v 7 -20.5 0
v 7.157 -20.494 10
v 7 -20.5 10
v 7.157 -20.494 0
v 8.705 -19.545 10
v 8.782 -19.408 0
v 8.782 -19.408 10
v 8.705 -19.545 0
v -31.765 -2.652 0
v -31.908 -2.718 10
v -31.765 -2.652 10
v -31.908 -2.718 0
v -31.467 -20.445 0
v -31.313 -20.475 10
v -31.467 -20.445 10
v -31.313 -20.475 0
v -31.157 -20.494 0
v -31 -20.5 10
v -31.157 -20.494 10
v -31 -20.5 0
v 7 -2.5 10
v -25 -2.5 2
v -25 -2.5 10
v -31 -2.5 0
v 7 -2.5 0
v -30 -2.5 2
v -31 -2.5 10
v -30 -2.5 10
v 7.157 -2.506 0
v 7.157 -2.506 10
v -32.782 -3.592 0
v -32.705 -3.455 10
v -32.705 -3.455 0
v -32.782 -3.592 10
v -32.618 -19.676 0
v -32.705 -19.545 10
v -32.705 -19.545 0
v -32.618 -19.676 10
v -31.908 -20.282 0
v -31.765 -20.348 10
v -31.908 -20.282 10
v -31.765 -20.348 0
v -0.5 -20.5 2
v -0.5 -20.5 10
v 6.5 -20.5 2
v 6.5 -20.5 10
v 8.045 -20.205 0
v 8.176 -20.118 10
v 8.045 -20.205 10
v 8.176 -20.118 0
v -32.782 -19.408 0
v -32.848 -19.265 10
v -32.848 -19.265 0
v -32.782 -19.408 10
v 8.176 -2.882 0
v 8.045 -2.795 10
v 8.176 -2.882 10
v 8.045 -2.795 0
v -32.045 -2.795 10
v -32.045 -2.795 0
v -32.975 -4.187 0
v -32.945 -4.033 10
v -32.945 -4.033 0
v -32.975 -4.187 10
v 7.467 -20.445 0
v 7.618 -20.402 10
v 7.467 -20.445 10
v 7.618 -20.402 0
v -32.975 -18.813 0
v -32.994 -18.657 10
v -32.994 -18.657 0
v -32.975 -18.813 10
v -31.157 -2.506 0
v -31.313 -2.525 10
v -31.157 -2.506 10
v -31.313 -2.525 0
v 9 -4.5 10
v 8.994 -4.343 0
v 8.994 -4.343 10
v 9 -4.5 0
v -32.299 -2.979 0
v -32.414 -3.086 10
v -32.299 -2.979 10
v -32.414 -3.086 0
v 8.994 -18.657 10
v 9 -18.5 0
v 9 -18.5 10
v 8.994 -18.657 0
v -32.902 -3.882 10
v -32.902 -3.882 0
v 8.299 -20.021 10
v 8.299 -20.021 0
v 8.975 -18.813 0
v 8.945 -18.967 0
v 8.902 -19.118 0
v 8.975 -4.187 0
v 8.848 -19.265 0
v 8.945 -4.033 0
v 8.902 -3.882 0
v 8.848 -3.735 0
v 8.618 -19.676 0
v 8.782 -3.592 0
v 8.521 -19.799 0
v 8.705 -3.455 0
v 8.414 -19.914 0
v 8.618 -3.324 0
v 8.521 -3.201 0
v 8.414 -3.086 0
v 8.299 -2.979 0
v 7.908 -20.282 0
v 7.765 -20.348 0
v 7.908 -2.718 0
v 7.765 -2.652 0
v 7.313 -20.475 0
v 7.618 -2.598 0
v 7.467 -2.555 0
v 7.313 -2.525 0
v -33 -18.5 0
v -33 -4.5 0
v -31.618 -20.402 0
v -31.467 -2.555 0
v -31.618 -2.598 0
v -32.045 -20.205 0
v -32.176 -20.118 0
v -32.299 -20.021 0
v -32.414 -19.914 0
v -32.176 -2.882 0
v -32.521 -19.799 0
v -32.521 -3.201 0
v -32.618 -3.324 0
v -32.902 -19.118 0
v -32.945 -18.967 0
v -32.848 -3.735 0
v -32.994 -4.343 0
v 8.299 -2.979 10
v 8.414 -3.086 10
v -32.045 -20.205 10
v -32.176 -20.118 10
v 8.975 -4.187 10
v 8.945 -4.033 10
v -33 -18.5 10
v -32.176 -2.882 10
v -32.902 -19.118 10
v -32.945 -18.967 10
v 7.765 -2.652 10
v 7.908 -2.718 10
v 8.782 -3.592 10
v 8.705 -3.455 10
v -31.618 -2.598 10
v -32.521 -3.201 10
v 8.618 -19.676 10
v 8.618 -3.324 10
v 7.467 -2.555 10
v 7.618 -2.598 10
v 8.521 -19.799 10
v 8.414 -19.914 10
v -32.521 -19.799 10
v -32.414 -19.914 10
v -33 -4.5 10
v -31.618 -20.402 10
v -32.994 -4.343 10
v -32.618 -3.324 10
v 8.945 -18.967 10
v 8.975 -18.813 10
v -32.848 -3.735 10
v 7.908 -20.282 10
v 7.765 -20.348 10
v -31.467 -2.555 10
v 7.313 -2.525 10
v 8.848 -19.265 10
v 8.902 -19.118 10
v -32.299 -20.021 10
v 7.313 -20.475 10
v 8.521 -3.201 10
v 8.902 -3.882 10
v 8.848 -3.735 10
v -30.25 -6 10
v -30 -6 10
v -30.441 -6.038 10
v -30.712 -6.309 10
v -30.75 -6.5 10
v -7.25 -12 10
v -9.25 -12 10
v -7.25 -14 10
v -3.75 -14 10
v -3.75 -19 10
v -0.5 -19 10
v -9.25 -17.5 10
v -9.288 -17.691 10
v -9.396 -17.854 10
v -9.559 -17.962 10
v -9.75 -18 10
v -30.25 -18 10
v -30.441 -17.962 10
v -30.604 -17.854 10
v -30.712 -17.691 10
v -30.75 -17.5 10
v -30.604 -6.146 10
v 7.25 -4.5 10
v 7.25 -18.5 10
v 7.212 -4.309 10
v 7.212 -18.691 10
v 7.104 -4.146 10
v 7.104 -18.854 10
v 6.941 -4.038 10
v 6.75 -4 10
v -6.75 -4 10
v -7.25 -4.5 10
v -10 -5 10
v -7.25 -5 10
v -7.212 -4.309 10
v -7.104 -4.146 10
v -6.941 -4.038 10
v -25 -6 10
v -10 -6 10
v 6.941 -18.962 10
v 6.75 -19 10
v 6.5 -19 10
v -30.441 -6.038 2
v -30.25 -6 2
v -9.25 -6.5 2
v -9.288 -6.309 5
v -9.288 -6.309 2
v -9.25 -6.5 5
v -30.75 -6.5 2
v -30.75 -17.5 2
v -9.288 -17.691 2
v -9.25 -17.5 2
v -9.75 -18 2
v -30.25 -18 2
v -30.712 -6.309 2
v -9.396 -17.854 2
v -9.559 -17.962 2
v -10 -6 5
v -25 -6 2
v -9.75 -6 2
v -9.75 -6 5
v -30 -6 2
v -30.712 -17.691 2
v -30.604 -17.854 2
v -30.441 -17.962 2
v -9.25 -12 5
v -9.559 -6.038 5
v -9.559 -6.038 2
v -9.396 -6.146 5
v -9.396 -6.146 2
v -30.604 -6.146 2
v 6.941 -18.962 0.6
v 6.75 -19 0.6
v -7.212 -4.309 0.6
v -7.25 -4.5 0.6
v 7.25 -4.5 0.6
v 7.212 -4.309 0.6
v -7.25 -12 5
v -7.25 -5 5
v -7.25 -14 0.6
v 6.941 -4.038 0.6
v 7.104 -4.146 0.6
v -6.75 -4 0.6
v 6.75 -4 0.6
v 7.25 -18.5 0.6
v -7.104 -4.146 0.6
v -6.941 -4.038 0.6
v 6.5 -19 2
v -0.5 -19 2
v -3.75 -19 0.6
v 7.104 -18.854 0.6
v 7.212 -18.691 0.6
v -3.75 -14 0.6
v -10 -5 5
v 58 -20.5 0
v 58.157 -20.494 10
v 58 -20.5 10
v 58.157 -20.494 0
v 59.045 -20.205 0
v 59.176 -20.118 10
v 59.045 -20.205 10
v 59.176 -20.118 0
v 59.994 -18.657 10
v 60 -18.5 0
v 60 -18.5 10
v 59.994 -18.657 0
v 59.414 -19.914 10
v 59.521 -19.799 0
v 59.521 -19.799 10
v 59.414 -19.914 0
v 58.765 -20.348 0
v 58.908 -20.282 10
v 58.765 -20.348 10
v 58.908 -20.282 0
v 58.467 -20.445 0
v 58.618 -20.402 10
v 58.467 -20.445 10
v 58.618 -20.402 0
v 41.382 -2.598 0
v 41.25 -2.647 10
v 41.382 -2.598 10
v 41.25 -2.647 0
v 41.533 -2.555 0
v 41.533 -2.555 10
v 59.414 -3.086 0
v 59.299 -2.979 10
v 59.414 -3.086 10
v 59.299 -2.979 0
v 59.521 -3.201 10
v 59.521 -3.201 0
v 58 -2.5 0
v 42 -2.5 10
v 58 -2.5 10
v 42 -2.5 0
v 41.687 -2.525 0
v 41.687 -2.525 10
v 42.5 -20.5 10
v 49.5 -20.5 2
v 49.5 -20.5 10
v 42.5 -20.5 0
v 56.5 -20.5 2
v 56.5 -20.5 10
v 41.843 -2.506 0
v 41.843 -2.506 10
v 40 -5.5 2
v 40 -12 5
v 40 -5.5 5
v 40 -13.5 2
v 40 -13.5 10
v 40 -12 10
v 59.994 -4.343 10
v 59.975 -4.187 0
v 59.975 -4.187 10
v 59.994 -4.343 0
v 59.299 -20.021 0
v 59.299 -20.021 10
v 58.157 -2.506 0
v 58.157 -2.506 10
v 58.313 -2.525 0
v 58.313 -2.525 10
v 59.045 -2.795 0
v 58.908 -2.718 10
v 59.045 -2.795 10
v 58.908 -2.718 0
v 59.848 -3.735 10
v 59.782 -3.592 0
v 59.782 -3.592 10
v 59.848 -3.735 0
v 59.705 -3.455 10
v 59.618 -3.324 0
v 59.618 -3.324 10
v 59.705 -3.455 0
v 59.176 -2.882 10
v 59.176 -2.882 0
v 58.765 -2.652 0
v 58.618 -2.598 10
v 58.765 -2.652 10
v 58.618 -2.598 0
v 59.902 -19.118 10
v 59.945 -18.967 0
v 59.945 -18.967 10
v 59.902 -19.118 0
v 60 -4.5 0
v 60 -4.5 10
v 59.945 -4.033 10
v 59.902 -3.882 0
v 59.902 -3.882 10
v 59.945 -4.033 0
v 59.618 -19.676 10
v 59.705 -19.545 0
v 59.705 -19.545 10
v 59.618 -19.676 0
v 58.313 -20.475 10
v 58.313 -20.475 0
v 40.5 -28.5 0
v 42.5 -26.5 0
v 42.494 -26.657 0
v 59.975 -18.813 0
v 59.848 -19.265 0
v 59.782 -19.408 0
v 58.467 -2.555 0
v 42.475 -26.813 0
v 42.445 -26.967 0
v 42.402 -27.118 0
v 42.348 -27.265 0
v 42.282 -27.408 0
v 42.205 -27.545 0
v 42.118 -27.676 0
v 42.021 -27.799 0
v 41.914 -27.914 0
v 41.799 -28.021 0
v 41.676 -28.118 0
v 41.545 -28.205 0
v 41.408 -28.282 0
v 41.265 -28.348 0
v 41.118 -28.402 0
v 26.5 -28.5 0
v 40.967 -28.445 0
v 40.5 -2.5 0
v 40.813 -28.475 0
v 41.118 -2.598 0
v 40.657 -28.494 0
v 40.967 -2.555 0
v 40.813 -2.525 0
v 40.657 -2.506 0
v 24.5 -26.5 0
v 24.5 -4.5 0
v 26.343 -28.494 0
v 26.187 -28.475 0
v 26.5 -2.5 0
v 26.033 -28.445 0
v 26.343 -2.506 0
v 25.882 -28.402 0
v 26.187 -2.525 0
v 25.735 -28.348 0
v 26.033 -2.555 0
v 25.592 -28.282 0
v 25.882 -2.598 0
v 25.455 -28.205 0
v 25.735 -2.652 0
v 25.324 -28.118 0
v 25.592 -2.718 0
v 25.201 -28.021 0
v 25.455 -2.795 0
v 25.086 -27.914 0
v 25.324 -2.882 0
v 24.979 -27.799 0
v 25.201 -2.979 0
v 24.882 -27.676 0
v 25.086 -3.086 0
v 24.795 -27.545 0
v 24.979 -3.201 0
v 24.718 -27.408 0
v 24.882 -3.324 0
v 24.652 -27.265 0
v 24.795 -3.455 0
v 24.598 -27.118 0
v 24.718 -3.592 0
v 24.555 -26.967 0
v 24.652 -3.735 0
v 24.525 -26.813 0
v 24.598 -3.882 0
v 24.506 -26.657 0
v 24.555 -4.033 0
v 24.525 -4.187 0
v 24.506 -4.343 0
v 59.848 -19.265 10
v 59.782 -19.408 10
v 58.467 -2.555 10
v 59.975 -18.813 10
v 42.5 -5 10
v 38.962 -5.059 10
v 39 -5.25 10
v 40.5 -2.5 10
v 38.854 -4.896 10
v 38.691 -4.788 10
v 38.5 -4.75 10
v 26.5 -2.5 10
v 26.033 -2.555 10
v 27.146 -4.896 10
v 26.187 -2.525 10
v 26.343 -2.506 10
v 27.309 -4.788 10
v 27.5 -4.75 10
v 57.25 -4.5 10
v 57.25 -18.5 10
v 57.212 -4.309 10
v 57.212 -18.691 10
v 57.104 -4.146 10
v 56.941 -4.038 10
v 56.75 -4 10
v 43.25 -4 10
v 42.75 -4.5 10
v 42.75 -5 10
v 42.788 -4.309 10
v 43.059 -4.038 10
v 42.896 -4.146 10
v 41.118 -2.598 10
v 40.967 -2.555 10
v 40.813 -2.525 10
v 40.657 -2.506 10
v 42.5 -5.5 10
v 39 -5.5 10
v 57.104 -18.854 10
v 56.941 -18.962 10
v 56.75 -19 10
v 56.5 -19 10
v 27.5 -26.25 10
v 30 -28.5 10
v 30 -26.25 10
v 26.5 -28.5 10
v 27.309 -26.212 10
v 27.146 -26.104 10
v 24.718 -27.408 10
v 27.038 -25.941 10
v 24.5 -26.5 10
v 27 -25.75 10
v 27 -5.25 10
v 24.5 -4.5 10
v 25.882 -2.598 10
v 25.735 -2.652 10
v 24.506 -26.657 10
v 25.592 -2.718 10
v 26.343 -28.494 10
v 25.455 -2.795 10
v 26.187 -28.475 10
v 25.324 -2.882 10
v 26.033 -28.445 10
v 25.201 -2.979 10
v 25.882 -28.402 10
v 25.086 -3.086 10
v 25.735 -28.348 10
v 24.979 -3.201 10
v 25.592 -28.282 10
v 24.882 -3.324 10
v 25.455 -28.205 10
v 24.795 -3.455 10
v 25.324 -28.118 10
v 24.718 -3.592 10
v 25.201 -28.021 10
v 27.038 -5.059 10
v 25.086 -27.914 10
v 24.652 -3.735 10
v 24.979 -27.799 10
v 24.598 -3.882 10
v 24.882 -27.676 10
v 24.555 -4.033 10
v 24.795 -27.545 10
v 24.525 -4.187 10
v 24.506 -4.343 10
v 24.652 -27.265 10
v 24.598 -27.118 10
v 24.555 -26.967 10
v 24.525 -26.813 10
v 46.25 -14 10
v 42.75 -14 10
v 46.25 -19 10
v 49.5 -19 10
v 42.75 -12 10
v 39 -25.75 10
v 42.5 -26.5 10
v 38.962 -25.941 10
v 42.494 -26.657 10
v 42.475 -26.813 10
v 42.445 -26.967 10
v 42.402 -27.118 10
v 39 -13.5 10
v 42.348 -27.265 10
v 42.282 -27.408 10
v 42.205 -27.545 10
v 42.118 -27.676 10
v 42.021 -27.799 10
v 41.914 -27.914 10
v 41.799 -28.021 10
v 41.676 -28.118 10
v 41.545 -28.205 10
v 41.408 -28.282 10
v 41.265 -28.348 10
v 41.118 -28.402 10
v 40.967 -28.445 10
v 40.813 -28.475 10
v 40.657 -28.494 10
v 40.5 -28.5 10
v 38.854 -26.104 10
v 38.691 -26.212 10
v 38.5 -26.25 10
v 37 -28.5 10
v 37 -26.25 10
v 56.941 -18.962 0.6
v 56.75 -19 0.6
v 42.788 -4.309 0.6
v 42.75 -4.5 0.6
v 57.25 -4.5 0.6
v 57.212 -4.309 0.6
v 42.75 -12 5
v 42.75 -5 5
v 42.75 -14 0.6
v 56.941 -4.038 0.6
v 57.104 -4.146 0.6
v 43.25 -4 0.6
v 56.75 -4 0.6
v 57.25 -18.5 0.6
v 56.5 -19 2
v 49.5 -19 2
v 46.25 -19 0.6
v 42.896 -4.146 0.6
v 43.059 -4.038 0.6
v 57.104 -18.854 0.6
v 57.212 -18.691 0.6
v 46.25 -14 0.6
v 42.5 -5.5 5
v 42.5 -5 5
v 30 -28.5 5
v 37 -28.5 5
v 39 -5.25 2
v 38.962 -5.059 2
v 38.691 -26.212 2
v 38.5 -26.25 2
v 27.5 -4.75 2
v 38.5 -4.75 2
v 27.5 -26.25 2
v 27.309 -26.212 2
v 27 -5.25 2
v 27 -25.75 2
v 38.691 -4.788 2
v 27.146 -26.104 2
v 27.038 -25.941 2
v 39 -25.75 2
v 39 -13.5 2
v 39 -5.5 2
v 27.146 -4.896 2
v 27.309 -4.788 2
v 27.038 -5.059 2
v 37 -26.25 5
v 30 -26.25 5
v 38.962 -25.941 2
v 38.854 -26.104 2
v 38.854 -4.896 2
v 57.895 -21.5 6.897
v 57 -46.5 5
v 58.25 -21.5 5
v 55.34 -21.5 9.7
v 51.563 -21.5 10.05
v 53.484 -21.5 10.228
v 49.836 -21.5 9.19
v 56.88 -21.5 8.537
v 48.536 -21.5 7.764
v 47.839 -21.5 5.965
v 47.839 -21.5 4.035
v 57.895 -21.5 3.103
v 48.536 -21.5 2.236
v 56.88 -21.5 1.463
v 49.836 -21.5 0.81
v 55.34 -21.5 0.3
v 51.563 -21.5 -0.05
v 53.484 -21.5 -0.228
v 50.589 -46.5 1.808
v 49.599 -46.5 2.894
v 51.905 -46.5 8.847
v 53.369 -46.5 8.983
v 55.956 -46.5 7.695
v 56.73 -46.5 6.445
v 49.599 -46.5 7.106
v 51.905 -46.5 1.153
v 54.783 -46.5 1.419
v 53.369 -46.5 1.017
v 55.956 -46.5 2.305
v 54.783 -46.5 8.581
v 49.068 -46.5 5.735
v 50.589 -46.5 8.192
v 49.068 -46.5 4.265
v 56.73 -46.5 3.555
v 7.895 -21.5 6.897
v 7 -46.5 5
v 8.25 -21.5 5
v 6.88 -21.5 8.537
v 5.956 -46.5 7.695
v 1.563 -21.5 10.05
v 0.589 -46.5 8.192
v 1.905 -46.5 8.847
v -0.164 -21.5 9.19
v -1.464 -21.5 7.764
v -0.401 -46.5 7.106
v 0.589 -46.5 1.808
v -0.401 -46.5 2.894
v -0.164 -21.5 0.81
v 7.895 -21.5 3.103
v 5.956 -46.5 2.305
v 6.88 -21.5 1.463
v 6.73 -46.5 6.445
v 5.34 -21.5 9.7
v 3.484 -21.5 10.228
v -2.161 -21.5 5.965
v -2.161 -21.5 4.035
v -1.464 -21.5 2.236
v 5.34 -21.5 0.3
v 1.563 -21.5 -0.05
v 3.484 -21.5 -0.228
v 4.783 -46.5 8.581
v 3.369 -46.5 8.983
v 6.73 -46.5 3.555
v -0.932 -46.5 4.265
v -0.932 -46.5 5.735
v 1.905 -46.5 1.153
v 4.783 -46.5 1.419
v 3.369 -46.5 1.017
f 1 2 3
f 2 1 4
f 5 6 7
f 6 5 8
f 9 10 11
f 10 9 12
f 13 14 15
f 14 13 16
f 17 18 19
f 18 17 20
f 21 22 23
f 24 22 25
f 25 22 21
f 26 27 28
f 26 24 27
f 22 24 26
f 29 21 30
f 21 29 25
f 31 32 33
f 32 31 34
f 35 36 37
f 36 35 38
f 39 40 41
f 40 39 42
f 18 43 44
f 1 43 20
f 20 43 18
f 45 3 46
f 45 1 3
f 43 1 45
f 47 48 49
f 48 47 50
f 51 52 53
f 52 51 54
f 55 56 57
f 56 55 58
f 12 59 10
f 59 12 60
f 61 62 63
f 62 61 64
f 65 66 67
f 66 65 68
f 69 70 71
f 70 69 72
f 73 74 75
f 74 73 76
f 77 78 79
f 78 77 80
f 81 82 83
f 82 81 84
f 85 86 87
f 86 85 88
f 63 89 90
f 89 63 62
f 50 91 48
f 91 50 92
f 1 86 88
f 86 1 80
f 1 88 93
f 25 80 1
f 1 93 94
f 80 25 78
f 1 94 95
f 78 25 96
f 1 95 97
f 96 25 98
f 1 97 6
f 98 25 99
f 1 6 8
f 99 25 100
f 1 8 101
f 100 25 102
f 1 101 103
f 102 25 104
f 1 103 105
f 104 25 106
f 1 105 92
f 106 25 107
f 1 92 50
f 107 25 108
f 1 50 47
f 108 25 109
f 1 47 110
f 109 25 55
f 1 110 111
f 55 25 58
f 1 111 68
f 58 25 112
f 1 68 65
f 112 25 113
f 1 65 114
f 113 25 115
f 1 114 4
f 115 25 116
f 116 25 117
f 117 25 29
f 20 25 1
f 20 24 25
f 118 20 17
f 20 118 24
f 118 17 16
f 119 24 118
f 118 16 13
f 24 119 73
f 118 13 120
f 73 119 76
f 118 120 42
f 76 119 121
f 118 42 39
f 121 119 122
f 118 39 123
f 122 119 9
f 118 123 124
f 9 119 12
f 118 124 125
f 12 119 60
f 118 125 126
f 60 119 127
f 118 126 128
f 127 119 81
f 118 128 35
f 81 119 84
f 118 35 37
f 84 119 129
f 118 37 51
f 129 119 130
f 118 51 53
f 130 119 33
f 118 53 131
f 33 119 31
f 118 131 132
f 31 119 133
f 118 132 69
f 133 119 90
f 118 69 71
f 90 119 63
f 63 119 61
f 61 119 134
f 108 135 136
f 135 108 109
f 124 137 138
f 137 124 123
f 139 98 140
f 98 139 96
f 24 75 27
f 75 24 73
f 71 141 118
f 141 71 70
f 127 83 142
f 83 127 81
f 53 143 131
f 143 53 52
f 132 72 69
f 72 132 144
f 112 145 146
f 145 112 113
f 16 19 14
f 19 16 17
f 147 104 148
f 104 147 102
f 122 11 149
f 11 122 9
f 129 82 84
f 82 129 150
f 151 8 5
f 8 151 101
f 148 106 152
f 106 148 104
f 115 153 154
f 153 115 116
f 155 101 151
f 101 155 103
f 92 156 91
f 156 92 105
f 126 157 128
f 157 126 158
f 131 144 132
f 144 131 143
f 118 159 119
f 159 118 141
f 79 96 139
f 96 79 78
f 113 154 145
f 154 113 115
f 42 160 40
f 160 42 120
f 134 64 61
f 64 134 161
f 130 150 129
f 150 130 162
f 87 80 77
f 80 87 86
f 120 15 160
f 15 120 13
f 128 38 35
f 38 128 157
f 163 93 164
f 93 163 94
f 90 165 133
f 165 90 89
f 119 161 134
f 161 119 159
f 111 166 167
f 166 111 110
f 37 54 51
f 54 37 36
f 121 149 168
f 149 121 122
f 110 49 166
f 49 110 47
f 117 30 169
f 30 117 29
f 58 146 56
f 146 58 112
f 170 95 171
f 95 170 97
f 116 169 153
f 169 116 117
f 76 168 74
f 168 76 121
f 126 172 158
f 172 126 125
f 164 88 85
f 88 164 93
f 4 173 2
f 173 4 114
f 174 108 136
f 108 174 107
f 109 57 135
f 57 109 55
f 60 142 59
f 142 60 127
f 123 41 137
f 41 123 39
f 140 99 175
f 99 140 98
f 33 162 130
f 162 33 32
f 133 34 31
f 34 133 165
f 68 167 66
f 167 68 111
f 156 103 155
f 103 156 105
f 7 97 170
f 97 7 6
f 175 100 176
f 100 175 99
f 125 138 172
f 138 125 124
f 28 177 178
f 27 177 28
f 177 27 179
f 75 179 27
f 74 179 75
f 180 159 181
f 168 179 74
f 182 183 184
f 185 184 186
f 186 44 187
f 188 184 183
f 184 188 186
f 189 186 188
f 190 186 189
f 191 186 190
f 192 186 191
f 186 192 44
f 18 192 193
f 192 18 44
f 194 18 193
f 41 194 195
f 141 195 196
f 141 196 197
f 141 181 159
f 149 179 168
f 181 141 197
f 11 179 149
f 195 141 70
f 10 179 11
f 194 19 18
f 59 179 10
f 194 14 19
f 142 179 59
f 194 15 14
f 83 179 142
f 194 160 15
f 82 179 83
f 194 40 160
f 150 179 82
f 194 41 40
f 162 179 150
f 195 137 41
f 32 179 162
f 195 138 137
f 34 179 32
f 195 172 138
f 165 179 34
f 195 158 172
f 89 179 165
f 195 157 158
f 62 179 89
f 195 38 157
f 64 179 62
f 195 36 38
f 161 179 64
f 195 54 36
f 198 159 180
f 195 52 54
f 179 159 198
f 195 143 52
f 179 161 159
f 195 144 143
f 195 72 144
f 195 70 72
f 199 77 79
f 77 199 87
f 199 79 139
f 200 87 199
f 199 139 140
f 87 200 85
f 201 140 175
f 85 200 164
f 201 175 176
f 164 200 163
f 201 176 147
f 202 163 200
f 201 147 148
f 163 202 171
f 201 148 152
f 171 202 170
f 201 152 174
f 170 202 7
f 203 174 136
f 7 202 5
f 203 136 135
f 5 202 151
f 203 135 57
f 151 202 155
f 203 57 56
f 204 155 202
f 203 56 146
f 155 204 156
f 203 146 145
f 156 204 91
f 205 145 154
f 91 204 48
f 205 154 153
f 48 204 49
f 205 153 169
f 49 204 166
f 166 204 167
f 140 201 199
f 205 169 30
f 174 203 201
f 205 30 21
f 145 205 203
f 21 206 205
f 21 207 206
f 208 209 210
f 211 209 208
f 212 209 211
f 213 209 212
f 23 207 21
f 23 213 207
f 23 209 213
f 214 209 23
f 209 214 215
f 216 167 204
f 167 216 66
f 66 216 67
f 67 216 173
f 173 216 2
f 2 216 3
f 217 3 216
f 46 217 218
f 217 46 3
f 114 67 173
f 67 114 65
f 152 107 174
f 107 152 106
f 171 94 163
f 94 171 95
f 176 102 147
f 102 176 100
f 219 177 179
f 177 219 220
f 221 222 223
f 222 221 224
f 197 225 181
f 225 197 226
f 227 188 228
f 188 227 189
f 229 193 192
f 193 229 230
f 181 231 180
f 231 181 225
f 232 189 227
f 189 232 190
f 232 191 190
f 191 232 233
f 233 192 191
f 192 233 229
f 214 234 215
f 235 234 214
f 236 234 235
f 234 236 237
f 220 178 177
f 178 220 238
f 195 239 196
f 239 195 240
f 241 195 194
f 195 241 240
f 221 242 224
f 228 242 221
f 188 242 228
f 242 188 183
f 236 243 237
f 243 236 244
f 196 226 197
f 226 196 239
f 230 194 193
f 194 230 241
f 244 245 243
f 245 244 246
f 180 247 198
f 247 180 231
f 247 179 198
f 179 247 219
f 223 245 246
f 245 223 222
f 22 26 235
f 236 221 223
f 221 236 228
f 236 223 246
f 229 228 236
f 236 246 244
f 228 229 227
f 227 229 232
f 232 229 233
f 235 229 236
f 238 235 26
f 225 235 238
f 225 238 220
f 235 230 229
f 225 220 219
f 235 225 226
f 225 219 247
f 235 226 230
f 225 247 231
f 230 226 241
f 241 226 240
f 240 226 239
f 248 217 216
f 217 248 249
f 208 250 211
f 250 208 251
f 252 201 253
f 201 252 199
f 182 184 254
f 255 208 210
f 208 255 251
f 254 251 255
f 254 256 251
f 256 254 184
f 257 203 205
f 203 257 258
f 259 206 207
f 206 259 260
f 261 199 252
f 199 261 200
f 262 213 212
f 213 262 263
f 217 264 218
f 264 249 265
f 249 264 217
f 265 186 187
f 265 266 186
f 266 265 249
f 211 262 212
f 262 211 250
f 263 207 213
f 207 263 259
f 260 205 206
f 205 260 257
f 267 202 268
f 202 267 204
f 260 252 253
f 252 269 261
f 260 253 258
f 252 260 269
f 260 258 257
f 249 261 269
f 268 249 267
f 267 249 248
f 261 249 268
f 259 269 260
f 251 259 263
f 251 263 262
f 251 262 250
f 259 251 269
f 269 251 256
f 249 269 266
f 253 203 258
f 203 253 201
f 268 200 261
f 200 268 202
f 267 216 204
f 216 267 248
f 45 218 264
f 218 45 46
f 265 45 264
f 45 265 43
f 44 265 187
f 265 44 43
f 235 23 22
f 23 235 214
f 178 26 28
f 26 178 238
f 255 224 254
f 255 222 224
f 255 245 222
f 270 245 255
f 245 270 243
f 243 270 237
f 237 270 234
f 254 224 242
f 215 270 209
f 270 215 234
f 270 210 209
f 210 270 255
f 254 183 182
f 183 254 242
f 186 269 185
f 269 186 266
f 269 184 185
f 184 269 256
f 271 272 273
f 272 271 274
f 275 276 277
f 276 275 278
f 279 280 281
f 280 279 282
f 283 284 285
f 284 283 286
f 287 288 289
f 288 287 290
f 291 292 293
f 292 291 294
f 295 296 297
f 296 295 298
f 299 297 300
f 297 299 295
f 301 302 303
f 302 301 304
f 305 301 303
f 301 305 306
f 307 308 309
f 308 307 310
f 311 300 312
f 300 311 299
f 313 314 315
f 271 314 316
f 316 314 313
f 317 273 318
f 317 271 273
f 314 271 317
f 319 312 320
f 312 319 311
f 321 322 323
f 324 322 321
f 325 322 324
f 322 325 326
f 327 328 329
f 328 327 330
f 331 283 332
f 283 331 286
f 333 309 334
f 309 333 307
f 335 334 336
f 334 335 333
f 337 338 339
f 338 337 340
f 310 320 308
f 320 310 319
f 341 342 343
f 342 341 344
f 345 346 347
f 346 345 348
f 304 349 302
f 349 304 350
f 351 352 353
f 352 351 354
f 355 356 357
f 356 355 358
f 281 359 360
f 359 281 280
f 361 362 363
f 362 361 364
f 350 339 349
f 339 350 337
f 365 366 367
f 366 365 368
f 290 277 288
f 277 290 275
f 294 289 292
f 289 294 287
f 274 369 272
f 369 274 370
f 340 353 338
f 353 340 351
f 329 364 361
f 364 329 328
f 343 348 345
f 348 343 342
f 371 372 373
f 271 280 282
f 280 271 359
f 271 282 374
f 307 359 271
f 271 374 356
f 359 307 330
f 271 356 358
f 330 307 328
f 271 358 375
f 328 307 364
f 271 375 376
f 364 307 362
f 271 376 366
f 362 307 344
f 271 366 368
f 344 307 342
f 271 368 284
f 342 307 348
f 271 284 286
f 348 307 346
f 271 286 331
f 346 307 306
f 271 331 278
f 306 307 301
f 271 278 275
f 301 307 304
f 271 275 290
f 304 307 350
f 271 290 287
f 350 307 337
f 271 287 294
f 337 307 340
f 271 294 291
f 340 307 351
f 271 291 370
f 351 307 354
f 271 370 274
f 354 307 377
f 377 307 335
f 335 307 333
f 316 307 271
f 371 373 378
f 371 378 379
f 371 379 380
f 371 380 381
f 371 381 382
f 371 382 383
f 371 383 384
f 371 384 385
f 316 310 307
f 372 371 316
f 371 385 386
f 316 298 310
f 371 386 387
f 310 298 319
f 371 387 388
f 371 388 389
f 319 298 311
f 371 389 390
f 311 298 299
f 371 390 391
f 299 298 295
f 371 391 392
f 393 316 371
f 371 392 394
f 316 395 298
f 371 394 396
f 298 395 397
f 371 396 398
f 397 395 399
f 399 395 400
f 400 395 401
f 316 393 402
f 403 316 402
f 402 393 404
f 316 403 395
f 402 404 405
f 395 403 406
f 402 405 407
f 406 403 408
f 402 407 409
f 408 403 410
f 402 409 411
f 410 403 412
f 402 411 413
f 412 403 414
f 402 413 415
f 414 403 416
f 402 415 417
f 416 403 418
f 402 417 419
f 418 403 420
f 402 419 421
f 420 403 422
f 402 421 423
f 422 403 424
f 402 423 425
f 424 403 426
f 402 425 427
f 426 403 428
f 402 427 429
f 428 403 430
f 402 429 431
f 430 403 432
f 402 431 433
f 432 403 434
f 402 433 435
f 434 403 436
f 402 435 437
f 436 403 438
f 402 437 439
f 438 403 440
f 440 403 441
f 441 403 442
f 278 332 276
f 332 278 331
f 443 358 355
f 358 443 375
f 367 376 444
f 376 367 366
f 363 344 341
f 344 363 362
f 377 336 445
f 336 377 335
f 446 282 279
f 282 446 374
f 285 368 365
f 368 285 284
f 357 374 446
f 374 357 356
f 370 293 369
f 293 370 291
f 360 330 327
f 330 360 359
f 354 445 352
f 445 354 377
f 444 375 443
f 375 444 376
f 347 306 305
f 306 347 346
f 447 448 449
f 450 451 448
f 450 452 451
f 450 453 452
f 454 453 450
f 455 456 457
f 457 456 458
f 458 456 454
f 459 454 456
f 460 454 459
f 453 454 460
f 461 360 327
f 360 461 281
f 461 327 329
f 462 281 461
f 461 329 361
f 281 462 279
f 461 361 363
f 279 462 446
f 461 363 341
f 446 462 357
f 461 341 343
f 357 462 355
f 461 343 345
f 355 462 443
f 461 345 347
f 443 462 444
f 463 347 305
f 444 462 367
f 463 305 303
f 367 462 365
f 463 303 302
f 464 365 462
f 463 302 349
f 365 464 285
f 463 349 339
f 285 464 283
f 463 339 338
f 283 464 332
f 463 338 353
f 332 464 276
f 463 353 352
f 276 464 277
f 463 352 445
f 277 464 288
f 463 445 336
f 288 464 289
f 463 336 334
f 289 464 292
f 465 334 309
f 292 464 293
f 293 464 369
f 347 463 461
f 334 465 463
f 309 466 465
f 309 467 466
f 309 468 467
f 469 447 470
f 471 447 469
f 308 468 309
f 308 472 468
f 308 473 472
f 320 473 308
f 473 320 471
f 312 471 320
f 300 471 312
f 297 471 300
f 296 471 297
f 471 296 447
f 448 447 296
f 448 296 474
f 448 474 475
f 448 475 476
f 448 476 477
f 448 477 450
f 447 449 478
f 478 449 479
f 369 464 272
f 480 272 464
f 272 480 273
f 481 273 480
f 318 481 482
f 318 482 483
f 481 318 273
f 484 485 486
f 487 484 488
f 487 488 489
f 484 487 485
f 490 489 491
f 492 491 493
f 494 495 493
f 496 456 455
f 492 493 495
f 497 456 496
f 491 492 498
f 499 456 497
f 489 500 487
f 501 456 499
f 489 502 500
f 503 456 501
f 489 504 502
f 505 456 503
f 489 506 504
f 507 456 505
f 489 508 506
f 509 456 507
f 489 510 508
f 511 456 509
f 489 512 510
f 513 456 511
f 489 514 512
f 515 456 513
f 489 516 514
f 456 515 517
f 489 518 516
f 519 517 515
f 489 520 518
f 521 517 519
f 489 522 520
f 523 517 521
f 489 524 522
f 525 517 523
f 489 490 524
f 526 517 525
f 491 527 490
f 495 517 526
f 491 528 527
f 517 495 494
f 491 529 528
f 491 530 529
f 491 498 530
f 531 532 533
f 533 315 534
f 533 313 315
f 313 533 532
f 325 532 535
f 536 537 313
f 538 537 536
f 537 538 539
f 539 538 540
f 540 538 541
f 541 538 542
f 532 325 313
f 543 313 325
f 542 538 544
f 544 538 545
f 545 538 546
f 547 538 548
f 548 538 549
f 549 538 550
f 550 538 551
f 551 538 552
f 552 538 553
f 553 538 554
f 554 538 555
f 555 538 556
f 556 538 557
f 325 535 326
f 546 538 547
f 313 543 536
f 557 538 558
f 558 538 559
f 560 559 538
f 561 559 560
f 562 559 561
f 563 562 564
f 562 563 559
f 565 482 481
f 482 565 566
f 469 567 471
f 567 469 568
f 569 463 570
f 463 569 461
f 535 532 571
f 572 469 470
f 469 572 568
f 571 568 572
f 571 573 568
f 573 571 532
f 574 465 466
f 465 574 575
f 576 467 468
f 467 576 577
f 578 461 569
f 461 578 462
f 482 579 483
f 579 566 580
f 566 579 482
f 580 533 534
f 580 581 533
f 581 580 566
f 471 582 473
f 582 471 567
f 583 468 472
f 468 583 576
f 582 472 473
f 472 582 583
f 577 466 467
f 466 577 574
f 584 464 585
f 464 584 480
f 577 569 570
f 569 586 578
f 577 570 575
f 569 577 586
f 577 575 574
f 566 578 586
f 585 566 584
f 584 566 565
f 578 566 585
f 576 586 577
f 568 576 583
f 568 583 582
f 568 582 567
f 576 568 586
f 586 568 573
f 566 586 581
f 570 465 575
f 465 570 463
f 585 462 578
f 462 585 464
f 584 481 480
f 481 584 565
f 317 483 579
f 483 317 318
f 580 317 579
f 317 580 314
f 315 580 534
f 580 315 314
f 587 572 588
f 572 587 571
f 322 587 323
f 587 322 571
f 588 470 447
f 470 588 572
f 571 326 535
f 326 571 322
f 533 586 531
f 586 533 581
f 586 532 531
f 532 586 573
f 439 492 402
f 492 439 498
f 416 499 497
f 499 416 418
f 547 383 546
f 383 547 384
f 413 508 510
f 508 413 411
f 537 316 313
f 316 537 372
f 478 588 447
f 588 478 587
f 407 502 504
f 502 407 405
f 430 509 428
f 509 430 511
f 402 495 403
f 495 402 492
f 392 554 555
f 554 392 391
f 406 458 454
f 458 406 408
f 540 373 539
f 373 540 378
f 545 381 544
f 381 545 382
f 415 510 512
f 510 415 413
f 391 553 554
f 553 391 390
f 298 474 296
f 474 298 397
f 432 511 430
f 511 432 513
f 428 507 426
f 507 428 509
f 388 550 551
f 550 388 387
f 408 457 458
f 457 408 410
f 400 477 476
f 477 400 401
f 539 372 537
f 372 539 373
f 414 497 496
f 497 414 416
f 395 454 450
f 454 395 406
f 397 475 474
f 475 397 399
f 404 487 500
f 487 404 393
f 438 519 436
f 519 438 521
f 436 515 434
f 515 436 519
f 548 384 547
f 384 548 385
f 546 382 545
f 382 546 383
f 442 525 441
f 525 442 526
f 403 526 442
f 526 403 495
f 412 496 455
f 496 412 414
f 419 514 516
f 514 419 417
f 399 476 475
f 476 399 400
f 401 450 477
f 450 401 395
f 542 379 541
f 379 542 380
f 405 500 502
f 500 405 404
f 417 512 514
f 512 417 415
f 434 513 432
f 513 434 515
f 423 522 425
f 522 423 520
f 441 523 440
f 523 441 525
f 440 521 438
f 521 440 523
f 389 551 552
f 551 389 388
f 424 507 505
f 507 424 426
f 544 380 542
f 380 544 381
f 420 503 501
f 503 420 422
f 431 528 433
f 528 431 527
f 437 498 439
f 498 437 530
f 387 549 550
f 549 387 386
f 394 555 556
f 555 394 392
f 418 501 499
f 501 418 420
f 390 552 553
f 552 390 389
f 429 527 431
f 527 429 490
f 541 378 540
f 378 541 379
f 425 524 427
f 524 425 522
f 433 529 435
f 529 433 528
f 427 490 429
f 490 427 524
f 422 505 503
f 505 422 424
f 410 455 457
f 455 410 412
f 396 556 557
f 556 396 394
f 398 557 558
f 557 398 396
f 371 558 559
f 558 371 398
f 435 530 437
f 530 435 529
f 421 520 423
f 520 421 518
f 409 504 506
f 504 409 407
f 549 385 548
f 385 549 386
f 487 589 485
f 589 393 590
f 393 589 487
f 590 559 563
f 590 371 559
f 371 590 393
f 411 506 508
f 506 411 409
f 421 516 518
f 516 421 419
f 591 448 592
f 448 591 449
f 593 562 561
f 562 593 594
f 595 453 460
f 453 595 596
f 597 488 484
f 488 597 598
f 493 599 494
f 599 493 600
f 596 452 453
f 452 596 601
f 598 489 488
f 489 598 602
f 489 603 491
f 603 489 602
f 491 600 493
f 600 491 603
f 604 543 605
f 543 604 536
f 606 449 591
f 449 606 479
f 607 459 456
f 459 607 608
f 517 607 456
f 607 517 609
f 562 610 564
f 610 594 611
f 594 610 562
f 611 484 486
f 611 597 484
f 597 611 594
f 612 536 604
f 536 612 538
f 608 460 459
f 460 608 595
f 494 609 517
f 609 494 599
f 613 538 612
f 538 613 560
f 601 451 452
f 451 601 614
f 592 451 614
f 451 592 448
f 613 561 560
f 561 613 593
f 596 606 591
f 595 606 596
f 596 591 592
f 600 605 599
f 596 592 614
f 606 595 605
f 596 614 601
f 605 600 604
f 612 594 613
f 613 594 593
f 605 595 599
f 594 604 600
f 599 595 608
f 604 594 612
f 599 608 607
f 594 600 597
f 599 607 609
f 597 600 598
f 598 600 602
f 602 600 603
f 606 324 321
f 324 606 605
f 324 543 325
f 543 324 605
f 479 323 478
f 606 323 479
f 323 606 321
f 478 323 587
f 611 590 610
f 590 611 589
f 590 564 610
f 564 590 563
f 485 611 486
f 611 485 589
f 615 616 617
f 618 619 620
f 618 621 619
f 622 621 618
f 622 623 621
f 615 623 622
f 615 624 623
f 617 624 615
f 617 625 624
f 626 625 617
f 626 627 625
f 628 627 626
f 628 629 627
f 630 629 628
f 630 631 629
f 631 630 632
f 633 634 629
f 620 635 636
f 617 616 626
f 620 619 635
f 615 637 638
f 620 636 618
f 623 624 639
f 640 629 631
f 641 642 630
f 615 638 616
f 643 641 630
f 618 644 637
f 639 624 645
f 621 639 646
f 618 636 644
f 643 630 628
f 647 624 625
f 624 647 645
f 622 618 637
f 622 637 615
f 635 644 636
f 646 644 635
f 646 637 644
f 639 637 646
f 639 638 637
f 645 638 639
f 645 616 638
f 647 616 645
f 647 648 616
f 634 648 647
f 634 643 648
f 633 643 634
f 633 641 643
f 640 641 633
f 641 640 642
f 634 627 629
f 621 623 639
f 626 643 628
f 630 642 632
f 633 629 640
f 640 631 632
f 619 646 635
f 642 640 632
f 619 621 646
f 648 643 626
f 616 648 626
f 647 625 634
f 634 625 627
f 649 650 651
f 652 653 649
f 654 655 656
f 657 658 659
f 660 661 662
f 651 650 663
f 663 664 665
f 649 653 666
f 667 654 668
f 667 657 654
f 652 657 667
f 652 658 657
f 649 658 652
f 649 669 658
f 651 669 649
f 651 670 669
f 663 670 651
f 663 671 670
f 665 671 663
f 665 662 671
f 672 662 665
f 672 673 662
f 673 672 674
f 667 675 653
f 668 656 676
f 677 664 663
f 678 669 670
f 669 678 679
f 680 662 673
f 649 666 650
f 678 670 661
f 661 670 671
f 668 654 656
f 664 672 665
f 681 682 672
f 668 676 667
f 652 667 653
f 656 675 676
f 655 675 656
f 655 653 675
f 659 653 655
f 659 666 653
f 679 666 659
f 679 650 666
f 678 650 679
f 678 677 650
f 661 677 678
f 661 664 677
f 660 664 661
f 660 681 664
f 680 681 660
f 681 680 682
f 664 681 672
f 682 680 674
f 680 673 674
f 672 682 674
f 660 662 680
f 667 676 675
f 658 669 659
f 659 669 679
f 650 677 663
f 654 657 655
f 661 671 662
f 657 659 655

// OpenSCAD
// powerbase
// base plate for the dcdc supply and power plug

module powerbase(){
// base borrowed from pieye
translate([25,25,0]){
difference(){
    color("yellow")
    linear_extrude(height=9.4+0.6)
    offset(r=2,$fn=80)    
    square(size=[14,38],center=true);

    translate([1,8,2])
    color("orange")
    linear_extrude(height=10)
    offset(r=0.5,$fn=16)    
    square(size=[11,20.5],center=true);

    translate([0,-11.5,0.6])
    color("pink")
    linear_extrude(height=10)
    offset(r=0.5,$fn=16)    
    square(size=[13.5,14],center=true);

    translate([-0.5,-22,2])
    color("green")
    cube([7,5,10]);

    translate([-7.25,-6,2])
    color("blue")
    cube([5,10,10]);

    translate([-10,-12,5])
    color("orange")
    cube([6,16,10]);
}

/*
    translate([1,12.25,0])
    color("red")
    linear_extrude(height=3.4)
    offset(r=0.5,$fn=16)    
    square(size=[12,15.5],center=true);
*/
    translate([-7.25,-19,0])
    color("blue")
    cube([3.5,5,10]);

}
}
//------------------
module powerbase2(){
difference(){
    color("yellow")
    translate([-12,-11.5,0])
    linear_extrude(height=9.4+0.6)
    offset(r=2,$fn=80)    
    square(size=[38,14],center=true);

    translate([-20,-12,2])
    color("orange")
    rotate([0,0,90])
    linear_extrude(height=10)
    offset(r=0.5,$fn=16)    
    square(size=[11,20.5],center=true);

    translate([0,-11.5,0.6])
    color("pink")
    linear_extrude(height=10)
    offset(r=0.5,$fn=16)    
    square(size=[13.5,14],center=true);

    translate([-0.5,-22,2])
    color("green")
    cube([7,5,10]);

    translate([-30,-7,2])
    color("blue")
    cube([5,10,10]);

    translate([-10,-12,5])
    color("orange")
    cube([6,7,10]);
}

    translate([-7.25,-19,0])
    color("blue")
    cube([3.5,5,10]);

}


//------------

module powerbase2b(){
//translate([-5,-27.5,0])
translate([-5,-35.5,0])
rotate([0,0,-90])
difference(){
    color("yellow")
    translate([-20,-11.5,0])
    linear_extrude(height=9.4+0.6)
    offset(r=2,$fn=80)    
    square(size=[22,14],center=true);

    translate([-20,-12,2])
    color("orange")
    rotate([0,0,90])
    linear_extrude(height=10)
    offset(r=0.5,$fn=16)    
    square(size=[11,20.5],center=true);

  
    translate([-30,-7,2])
    color("blue")
    cube([8,10,10]);

    translate([-10,-15,5])
    color("orange")
    cube([6,7,10]);
}

}

module powerbase2a(){
difference(){
    color("yellow")
    translate([0,-11.5,0])
    linear_extrude(height=9.4+0.6)
    offset(r=2,$fn=80)    
    square(size=[16,14],center=true);

    translate([0,-11.5,0.6])
    color("pink")
    linear_extrude(height=10)
    offset(r=0.5,$fn=16)    
    square(size=[13.5,14],center=true);

    translate([-0.5,-22,2])
    color("green")
    cube([7,5,10]);

    translate([-11,-12,5])
    color("orange")
    cube([6,7,10]);
}

    translate([-7.25,-19,0])
    color("blue")
    cube([3.5,5,10]);

}


//---
module powerplug(){

translate([28,3.5,5]){
    rotate([90,0,0])
    cylinder(r1=10.5/2,r2=8/2,h=25);
}
}

//---
module powerplug2(){

translate([28-25,3.5-25,5]){
    rotate([90,0,0])
    cylinder(r1=10.5/2,r2=8/2,h=25);
}
}

//-----------
module powerbasecut(){
    color("yellow")
    translate([25,25,0]){
    linear_extrude(height=9.4+0.6)
    offset(r=2+0.2,$fn=80)    
    square(size=[14,38],center=true);
    }
}

//------------
powerbase2();
powerplug2();

translate([50,0,0]){
    powerbase2a();
    powerbase2b();
    powerplug2();
}

/*
translate([0,0,0])
powerlid();
*/

//pibase();


//---------- end of file ------------------
